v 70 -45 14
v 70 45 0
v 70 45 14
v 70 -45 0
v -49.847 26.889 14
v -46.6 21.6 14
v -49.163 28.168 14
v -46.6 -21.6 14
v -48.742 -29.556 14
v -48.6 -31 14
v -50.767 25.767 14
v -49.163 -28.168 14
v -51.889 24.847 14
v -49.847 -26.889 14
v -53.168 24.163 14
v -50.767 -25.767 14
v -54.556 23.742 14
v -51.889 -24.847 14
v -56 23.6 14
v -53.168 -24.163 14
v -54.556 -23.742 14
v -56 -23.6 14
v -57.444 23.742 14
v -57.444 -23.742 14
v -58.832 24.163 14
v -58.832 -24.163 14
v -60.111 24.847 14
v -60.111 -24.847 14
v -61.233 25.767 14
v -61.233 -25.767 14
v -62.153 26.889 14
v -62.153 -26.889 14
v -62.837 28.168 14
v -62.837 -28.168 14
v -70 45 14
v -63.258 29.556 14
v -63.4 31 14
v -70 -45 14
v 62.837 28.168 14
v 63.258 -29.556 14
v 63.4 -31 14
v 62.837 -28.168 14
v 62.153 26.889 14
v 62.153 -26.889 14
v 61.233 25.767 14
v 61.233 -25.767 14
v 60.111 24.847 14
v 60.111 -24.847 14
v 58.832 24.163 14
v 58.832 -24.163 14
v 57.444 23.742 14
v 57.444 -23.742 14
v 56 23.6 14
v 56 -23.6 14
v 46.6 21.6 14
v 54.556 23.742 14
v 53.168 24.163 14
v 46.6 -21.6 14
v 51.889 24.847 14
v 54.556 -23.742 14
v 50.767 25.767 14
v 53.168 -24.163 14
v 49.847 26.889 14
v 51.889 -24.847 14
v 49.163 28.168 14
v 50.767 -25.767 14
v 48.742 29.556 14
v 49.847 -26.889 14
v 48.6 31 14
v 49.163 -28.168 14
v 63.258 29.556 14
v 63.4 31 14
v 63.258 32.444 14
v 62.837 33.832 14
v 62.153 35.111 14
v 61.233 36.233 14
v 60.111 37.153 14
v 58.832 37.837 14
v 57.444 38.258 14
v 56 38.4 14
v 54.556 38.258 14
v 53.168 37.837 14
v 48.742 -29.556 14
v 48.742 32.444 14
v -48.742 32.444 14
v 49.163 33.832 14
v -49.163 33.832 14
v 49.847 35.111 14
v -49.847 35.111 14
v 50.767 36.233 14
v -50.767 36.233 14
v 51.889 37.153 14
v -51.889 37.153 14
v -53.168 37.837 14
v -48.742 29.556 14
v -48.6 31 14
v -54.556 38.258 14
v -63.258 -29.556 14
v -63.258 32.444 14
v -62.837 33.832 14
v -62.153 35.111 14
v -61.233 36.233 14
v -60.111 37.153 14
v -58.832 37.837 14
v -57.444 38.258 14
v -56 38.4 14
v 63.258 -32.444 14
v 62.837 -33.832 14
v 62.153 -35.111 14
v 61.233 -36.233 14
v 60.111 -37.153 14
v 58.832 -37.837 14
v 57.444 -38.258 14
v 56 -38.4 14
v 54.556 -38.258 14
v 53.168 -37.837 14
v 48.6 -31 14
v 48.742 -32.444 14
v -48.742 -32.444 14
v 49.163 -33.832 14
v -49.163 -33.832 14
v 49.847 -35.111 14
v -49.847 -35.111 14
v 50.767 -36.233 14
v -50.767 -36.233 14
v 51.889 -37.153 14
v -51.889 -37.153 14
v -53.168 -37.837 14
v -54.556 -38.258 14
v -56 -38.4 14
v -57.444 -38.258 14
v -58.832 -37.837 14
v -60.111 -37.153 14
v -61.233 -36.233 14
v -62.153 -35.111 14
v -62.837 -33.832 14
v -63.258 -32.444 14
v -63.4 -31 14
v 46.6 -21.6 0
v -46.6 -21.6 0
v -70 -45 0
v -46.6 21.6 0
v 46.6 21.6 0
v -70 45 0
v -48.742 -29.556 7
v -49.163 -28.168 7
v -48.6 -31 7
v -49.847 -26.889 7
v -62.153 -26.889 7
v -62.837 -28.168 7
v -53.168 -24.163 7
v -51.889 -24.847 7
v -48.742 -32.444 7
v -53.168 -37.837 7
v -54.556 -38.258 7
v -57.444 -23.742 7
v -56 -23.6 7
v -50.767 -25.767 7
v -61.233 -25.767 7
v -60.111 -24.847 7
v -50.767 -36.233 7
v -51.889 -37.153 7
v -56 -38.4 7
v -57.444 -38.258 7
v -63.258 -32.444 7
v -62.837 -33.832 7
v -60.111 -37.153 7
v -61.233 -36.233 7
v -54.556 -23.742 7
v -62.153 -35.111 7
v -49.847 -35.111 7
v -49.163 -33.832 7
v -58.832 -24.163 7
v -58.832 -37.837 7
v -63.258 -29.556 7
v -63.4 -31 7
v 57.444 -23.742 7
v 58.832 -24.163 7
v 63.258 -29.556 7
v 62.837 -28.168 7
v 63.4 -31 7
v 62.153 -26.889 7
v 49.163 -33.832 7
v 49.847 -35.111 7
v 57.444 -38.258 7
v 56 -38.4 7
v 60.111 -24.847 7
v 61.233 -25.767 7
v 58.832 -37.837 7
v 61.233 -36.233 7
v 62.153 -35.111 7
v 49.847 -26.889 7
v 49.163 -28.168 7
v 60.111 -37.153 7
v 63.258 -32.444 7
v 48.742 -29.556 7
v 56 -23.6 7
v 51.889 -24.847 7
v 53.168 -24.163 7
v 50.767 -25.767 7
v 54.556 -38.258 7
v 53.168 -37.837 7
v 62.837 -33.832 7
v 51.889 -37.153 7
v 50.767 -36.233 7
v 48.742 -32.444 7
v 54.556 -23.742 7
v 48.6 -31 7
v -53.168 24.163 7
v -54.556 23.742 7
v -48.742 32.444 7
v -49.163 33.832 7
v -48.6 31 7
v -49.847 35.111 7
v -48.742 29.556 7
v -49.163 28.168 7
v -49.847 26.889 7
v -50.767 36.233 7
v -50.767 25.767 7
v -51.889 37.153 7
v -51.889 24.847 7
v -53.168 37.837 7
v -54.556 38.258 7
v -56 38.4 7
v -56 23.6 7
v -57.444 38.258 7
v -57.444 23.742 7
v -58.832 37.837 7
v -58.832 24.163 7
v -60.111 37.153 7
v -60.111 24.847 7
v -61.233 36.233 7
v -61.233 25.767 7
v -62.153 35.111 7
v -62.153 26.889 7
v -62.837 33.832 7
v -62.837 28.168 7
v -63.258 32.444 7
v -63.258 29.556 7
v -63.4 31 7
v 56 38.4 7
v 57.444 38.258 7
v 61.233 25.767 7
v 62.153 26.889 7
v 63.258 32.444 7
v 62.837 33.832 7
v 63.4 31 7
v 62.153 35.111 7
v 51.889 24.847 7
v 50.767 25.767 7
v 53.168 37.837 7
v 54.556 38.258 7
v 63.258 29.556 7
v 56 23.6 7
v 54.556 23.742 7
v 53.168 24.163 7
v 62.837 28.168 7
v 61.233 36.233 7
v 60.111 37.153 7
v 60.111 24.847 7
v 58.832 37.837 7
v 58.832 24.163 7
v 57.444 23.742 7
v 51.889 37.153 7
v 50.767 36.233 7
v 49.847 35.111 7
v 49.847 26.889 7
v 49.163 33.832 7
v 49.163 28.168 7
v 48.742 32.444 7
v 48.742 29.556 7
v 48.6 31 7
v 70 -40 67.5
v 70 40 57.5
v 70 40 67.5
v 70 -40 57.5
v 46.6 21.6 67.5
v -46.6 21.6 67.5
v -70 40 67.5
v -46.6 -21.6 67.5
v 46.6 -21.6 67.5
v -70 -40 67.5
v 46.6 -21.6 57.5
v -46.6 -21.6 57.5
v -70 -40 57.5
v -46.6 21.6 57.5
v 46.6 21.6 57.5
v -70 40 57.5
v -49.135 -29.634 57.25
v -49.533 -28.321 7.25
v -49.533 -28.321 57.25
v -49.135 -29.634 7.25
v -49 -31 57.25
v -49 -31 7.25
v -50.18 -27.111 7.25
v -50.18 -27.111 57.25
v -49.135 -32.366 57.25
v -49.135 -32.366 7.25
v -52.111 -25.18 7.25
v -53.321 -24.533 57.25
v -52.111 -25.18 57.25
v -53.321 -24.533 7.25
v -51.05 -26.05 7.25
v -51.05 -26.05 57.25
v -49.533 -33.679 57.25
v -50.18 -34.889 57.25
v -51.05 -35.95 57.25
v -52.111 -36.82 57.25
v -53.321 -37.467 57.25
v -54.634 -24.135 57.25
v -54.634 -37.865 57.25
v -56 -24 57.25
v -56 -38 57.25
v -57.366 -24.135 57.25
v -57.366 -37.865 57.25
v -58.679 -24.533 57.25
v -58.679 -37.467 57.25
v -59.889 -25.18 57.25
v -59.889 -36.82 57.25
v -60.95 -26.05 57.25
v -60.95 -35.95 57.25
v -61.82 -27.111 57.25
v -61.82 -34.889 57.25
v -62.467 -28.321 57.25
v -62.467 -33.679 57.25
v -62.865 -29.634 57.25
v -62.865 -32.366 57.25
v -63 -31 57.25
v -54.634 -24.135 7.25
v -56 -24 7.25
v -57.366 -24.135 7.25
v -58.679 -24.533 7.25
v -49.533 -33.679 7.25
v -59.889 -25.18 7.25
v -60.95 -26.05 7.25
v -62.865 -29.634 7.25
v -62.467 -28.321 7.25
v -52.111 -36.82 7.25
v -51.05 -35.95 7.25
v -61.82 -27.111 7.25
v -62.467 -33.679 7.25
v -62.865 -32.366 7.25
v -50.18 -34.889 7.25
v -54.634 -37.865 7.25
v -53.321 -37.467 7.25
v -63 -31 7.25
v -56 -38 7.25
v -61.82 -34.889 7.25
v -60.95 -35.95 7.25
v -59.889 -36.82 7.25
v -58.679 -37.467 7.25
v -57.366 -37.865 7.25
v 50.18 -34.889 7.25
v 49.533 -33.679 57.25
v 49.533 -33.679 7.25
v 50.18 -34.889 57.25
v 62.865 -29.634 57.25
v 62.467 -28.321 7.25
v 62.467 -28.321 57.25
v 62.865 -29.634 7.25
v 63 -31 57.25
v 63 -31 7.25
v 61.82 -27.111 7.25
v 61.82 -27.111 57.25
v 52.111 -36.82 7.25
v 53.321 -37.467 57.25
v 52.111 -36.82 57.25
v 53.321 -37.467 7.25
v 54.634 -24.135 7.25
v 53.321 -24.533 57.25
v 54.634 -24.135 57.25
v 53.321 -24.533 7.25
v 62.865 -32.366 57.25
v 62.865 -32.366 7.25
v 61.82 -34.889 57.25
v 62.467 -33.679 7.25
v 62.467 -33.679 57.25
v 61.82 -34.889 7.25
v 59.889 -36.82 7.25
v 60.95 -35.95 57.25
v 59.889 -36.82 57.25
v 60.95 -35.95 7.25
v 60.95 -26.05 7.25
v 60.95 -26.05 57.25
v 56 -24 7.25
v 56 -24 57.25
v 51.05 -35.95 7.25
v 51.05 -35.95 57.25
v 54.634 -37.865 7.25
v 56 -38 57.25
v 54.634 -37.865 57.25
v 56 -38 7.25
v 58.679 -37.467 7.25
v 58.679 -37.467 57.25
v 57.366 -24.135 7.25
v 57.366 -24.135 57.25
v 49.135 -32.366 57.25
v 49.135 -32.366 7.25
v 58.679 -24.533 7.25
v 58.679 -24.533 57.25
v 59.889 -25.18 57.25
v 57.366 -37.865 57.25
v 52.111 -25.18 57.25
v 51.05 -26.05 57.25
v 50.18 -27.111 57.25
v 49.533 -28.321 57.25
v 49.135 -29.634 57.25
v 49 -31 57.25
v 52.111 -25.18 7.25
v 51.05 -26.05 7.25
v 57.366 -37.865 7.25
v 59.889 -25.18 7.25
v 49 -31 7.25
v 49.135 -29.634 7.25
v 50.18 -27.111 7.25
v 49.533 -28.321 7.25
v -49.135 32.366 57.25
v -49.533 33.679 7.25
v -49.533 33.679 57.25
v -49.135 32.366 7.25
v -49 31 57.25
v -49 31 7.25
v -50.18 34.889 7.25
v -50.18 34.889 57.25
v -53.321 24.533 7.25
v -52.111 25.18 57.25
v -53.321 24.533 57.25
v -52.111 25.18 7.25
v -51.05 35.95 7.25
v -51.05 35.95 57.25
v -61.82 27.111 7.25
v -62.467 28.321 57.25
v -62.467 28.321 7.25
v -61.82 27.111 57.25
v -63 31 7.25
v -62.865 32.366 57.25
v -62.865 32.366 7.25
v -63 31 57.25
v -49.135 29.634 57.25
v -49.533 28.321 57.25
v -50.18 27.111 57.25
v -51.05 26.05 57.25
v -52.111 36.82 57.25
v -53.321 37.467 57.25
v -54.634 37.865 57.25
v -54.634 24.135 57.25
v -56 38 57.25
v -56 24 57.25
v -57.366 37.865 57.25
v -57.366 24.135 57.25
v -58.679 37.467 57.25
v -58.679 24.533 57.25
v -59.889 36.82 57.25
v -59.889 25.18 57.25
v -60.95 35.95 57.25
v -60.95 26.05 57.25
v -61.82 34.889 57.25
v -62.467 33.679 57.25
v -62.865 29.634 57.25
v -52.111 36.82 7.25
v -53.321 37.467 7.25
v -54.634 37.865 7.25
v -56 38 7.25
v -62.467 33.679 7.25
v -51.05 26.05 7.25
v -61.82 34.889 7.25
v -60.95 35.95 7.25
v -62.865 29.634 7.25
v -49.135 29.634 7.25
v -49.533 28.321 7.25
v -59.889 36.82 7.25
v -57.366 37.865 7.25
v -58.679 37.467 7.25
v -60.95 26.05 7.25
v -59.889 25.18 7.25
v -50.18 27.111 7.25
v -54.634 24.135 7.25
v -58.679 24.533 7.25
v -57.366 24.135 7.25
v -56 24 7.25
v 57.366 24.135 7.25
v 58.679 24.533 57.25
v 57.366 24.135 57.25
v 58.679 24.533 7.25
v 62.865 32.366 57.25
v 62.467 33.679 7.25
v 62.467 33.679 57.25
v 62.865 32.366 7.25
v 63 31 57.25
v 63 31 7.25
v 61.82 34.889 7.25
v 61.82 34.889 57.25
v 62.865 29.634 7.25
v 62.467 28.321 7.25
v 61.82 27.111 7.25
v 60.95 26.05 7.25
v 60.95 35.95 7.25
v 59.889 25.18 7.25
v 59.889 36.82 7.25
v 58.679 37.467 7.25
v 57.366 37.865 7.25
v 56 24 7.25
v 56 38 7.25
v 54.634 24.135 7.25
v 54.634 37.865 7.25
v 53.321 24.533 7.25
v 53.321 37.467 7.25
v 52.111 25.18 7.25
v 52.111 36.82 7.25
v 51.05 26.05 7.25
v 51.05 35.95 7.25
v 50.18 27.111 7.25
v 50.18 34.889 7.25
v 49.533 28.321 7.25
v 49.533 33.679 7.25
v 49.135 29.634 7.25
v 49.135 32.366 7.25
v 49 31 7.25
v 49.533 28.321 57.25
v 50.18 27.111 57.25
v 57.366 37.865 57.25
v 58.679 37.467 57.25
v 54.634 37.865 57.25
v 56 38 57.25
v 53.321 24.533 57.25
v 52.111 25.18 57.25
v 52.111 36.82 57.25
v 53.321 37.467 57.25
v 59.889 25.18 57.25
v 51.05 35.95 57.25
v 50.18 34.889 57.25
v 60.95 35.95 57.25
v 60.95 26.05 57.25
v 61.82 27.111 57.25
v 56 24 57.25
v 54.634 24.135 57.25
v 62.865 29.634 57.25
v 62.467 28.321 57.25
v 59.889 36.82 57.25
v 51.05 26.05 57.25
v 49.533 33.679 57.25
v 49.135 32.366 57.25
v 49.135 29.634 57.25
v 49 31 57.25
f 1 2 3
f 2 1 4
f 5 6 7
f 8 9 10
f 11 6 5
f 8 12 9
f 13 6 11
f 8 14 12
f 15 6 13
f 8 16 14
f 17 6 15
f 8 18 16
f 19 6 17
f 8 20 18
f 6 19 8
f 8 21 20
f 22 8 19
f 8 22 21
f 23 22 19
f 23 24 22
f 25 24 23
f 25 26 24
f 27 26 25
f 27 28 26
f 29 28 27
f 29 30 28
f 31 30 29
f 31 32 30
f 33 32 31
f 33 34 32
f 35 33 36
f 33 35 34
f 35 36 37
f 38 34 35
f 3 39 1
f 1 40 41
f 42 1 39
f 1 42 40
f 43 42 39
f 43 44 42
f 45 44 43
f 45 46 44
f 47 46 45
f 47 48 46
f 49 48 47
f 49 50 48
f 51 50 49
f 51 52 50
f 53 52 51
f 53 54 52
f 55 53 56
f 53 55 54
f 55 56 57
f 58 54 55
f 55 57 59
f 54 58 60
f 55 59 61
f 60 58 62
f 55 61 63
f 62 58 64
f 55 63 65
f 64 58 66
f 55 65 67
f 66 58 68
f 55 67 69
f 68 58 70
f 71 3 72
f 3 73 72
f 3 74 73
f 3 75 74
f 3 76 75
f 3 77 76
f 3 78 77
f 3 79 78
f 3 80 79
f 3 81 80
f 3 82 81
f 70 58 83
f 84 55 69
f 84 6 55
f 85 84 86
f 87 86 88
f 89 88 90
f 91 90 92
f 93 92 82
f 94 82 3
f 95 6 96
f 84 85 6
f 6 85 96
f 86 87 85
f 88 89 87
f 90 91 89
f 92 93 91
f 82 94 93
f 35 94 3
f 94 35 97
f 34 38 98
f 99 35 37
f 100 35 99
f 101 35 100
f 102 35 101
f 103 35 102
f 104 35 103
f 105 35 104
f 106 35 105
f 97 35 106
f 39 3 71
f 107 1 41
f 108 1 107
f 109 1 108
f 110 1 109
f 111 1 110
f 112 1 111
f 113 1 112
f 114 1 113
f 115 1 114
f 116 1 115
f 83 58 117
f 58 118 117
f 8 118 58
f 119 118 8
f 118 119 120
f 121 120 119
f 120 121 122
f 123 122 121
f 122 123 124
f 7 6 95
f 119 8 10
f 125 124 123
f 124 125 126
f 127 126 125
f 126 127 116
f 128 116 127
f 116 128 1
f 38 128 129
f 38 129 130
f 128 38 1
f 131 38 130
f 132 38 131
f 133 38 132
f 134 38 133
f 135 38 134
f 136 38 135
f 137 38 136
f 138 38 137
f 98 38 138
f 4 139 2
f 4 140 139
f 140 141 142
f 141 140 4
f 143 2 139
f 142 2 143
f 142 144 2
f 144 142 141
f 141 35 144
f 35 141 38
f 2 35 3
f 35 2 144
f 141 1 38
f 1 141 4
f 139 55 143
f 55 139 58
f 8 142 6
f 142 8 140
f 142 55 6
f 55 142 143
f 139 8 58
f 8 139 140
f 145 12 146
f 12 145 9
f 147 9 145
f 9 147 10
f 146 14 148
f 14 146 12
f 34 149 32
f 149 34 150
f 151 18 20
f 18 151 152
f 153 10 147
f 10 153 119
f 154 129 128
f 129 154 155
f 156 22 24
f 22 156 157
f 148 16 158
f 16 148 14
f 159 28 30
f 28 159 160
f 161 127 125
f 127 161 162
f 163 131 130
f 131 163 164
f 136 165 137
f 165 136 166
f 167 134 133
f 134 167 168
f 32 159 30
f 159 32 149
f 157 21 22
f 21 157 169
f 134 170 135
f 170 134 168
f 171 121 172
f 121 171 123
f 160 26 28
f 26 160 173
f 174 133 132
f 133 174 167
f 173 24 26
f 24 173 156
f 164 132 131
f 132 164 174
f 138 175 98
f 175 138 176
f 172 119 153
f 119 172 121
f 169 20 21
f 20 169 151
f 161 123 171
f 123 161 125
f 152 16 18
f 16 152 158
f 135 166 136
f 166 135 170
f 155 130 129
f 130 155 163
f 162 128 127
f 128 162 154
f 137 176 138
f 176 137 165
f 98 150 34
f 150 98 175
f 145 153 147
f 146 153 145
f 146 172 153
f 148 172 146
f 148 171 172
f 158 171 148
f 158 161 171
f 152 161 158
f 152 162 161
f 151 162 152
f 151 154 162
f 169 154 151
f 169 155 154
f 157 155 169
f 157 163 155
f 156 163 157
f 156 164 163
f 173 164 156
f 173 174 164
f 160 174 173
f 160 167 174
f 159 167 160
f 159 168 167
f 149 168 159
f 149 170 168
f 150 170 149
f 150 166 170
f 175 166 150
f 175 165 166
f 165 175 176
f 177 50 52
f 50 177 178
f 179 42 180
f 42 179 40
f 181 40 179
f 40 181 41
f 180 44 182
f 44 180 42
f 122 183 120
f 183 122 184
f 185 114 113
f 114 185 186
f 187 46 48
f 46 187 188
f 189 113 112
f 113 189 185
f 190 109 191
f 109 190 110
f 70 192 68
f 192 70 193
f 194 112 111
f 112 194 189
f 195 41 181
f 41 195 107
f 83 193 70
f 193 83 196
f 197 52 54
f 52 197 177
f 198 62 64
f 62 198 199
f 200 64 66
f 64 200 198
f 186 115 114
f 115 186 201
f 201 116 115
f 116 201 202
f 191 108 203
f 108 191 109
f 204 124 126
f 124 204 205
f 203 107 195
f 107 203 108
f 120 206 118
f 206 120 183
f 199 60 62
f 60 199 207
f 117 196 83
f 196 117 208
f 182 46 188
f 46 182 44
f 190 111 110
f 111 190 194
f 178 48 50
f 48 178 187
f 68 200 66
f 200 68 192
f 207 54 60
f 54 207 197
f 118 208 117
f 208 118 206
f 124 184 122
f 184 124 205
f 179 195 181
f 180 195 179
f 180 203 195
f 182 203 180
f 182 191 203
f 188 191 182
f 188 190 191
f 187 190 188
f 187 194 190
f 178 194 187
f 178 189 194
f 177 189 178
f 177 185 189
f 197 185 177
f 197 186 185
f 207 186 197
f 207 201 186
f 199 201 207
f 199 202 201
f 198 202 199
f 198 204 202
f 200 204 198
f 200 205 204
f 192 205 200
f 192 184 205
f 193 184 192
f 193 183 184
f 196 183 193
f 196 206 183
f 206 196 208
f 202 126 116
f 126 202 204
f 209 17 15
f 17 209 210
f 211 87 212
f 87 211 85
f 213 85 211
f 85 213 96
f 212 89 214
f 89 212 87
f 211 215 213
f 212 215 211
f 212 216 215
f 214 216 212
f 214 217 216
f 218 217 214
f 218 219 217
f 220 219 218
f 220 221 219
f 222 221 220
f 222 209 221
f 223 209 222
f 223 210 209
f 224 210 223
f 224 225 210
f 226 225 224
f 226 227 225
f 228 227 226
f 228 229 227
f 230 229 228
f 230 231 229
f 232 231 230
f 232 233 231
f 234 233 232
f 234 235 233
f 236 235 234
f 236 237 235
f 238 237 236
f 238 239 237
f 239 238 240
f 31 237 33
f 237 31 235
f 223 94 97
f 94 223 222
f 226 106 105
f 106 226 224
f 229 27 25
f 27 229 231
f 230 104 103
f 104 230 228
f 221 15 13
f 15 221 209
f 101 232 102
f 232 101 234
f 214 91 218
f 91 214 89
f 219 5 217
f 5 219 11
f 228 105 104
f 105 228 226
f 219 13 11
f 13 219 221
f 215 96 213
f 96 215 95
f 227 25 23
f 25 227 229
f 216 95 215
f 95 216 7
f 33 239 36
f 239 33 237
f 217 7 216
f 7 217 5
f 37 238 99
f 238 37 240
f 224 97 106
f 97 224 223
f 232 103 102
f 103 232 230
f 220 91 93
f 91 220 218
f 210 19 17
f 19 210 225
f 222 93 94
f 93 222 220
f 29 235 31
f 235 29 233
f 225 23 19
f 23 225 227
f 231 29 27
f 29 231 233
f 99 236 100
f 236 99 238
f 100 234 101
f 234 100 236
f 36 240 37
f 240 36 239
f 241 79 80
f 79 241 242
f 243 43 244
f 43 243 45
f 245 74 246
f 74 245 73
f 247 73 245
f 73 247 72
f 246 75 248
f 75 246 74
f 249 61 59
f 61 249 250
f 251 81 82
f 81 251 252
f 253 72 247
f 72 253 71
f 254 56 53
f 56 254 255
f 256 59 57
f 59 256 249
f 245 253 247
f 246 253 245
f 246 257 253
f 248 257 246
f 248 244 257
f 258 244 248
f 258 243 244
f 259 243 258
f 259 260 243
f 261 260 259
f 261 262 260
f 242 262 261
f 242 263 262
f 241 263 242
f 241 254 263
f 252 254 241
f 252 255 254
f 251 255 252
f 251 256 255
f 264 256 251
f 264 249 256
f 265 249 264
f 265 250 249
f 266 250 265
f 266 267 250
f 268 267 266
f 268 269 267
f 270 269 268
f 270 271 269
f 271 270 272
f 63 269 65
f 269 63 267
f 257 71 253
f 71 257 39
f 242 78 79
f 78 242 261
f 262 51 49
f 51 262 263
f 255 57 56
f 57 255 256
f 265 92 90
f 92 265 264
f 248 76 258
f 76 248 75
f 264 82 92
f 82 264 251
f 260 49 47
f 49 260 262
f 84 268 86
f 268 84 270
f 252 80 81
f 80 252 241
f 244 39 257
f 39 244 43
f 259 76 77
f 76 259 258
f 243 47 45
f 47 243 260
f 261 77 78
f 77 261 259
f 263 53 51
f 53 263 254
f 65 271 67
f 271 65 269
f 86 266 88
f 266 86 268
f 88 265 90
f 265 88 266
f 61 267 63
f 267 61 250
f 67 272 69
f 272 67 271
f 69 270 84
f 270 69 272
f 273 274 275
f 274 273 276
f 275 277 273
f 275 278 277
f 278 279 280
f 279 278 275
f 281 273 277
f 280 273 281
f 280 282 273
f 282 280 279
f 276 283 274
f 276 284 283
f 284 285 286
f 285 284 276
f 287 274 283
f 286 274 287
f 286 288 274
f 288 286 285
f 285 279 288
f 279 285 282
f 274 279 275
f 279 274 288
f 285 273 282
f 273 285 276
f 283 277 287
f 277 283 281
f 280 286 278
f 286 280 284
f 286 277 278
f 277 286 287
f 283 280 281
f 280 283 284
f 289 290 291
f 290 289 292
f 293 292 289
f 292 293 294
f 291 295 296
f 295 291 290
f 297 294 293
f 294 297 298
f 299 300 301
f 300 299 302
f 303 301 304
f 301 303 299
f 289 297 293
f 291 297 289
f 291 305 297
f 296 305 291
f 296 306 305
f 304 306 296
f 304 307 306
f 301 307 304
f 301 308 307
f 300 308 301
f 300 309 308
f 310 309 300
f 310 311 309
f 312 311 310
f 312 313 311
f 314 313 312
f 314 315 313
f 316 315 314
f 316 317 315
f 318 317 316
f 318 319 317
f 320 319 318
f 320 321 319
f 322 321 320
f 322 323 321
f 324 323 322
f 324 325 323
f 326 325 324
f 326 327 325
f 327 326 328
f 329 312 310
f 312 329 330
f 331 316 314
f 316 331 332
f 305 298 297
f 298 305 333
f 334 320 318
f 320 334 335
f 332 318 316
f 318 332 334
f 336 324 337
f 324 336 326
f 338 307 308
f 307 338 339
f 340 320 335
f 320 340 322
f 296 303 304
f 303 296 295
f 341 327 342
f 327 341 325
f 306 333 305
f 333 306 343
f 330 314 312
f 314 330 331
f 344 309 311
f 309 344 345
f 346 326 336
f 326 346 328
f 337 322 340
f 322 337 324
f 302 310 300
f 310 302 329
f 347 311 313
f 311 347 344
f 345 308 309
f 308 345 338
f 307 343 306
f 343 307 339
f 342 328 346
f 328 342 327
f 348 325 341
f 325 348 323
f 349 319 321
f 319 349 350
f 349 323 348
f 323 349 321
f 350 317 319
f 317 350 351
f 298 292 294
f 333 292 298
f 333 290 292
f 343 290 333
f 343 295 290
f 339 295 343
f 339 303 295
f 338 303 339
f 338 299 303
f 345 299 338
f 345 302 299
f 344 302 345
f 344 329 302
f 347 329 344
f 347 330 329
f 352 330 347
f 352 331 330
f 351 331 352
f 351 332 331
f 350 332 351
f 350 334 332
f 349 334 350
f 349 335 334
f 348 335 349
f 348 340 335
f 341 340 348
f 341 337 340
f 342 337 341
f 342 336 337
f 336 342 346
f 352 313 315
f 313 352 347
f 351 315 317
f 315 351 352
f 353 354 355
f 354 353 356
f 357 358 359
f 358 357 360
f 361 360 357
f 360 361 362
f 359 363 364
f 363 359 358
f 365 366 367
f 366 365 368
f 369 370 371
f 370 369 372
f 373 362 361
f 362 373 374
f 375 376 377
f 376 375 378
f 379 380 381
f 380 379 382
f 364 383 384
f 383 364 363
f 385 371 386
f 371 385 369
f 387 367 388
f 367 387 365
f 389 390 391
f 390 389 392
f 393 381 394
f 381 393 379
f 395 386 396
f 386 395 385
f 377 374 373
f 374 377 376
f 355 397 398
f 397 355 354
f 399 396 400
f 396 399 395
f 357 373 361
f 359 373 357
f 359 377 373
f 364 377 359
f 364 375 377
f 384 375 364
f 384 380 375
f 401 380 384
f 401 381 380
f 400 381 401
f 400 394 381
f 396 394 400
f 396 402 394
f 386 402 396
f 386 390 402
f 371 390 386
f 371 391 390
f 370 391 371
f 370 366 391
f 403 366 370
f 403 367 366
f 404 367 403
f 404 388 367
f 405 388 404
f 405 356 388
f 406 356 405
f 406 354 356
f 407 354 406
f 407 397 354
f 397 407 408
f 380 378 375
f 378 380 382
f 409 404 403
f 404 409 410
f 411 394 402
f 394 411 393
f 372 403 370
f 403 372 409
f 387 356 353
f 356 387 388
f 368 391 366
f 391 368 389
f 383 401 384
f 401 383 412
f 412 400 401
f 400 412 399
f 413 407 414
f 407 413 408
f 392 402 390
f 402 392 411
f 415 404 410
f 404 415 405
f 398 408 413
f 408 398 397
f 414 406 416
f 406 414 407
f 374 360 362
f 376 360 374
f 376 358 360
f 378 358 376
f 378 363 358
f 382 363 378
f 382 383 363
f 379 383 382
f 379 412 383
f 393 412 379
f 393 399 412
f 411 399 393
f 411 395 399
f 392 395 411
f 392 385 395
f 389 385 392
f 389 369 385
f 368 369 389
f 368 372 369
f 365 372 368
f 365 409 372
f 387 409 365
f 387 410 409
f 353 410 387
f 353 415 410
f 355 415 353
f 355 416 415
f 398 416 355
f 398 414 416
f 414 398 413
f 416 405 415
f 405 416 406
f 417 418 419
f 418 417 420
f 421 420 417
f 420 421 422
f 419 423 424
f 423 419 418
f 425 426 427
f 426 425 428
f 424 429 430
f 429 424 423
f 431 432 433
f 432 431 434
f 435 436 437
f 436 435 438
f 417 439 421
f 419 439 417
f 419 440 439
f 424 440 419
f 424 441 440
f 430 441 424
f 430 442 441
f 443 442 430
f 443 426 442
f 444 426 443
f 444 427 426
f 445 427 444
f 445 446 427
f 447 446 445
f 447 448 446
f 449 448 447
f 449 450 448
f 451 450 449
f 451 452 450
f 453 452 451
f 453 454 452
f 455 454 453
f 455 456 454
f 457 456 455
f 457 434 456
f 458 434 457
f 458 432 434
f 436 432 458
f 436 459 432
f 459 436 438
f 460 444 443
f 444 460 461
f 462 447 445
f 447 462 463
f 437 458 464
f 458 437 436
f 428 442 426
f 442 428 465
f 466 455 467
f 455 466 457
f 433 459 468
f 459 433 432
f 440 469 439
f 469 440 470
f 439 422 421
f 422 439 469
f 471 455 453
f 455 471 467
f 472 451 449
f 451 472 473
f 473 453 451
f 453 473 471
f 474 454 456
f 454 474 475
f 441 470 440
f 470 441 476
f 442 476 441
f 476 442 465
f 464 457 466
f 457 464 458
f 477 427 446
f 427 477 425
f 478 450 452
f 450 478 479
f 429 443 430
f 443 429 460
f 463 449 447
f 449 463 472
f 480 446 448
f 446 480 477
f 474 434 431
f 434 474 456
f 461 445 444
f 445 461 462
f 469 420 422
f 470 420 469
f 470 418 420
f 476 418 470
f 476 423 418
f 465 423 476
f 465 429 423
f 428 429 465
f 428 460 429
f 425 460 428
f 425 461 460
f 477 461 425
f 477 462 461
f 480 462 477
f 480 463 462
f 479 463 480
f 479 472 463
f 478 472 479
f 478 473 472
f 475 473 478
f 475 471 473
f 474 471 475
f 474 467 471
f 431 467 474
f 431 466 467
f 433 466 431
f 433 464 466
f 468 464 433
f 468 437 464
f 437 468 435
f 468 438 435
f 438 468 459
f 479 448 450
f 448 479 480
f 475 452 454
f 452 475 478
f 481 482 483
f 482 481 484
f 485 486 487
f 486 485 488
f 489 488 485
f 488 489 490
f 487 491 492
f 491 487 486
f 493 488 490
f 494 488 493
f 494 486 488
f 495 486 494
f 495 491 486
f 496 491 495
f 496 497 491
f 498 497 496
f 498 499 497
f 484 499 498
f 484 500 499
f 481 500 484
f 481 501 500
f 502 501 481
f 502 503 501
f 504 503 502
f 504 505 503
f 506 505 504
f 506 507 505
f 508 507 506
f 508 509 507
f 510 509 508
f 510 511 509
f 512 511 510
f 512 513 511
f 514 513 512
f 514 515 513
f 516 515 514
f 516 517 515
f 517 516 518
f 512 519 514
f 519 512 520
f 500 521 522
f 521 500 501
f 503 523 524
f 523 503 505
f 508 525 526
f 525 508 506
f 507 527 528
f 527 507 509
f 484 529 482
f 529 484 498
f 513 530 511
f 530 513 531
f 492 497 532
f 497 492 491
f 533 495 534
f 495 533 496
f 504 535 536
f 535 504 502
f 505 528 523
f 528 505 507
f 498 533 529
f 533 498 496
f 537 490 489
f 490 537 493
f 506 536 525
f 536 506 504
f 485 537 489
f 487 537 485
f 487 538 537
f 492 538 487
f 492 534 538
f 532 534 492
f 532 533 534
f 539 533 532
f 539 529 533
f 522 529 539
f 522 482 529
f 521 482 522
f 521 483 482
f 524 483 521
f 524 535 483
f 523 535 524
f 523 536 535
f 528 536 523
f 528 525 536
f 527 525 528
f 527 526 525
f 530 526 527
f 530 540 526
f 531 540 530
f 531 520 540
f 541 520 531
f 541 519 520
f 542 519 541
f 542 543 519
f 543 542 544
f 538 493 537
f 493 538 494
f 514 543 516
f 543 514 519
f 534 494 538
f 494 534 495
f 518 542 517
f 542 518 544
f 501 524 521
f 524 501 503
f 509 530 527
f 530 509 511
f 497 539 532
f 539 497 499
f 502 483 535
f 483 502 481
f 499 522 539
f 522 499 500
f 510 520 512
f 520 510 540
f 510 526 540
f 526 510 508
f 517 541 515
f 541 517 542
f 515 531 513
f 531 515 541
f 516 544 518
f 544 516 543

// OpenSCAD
$fn = 32;

// ------------------------------------------------------------------------
// Frame cube: base 140 x 90 mm, posts 50 mm tall
// Every part is its own module, assembly() places every instance.
// ------------------------------------------------------------------------

// --- part 1 ---
module base_frame() {
  difference() {
    translate([-70, -45, 0]) cube([140, 90, 14]);
    translate([-46.6, -21.6, -1]) cube([93.2, 43.2, 16]);
    translate([-56, -31, 7]) cylinder(h = 8, d = 14.8);
    translate([56, -31, 7]) cylinder(h = 8, d = 14.8);
    translate([-56, 31, 7]) cylinder(h = 8, d = 14.8);
    translate([56, 31, 7]) cylinder(h = 8, d = 14.8);
  }
}

// --- part 2 ---
module corner_post() {
  cylinder(h = 50, d = 14);
}

// --- part 3 ---
module top_frame() {
  difference() {
    translate([-70, -40, 0]) cube([140, 80, 10]);
    translate([-46.6, -21.6, -1]) cube([93.2, 43.2, 12]);
  }
}

// --- assembly ---
module assembly() {
  color([0.80, 0.24, 0.20]) translate([0, 0, 0]) rotate([0, 0, 0]) base_frame();
  color([0.20, 0.45, 0.75]) translate([-56, -31, 7.25]) rotate([0, 0, 0]) corner_post();
  color([0.25, 0.62, 0.32]) translate([56, -31, 7.25]) rotate([0, 0, 0]) corner_post();
  color([0.92, 0.70, 0.18]) translate([-56, 31, 7.25]) rotate([0, 0, 0]) corner_post();
  color([0.58, 0.35, 0.70]) translate([56, 31, 7.25]) rotate([0, 0, 0]) corner_post();
  color([0.16, 0.66, 0.66]) translate([0, 0, 57.5]) rotate([0, 0, 0]) top_frame();
}

assembly();
